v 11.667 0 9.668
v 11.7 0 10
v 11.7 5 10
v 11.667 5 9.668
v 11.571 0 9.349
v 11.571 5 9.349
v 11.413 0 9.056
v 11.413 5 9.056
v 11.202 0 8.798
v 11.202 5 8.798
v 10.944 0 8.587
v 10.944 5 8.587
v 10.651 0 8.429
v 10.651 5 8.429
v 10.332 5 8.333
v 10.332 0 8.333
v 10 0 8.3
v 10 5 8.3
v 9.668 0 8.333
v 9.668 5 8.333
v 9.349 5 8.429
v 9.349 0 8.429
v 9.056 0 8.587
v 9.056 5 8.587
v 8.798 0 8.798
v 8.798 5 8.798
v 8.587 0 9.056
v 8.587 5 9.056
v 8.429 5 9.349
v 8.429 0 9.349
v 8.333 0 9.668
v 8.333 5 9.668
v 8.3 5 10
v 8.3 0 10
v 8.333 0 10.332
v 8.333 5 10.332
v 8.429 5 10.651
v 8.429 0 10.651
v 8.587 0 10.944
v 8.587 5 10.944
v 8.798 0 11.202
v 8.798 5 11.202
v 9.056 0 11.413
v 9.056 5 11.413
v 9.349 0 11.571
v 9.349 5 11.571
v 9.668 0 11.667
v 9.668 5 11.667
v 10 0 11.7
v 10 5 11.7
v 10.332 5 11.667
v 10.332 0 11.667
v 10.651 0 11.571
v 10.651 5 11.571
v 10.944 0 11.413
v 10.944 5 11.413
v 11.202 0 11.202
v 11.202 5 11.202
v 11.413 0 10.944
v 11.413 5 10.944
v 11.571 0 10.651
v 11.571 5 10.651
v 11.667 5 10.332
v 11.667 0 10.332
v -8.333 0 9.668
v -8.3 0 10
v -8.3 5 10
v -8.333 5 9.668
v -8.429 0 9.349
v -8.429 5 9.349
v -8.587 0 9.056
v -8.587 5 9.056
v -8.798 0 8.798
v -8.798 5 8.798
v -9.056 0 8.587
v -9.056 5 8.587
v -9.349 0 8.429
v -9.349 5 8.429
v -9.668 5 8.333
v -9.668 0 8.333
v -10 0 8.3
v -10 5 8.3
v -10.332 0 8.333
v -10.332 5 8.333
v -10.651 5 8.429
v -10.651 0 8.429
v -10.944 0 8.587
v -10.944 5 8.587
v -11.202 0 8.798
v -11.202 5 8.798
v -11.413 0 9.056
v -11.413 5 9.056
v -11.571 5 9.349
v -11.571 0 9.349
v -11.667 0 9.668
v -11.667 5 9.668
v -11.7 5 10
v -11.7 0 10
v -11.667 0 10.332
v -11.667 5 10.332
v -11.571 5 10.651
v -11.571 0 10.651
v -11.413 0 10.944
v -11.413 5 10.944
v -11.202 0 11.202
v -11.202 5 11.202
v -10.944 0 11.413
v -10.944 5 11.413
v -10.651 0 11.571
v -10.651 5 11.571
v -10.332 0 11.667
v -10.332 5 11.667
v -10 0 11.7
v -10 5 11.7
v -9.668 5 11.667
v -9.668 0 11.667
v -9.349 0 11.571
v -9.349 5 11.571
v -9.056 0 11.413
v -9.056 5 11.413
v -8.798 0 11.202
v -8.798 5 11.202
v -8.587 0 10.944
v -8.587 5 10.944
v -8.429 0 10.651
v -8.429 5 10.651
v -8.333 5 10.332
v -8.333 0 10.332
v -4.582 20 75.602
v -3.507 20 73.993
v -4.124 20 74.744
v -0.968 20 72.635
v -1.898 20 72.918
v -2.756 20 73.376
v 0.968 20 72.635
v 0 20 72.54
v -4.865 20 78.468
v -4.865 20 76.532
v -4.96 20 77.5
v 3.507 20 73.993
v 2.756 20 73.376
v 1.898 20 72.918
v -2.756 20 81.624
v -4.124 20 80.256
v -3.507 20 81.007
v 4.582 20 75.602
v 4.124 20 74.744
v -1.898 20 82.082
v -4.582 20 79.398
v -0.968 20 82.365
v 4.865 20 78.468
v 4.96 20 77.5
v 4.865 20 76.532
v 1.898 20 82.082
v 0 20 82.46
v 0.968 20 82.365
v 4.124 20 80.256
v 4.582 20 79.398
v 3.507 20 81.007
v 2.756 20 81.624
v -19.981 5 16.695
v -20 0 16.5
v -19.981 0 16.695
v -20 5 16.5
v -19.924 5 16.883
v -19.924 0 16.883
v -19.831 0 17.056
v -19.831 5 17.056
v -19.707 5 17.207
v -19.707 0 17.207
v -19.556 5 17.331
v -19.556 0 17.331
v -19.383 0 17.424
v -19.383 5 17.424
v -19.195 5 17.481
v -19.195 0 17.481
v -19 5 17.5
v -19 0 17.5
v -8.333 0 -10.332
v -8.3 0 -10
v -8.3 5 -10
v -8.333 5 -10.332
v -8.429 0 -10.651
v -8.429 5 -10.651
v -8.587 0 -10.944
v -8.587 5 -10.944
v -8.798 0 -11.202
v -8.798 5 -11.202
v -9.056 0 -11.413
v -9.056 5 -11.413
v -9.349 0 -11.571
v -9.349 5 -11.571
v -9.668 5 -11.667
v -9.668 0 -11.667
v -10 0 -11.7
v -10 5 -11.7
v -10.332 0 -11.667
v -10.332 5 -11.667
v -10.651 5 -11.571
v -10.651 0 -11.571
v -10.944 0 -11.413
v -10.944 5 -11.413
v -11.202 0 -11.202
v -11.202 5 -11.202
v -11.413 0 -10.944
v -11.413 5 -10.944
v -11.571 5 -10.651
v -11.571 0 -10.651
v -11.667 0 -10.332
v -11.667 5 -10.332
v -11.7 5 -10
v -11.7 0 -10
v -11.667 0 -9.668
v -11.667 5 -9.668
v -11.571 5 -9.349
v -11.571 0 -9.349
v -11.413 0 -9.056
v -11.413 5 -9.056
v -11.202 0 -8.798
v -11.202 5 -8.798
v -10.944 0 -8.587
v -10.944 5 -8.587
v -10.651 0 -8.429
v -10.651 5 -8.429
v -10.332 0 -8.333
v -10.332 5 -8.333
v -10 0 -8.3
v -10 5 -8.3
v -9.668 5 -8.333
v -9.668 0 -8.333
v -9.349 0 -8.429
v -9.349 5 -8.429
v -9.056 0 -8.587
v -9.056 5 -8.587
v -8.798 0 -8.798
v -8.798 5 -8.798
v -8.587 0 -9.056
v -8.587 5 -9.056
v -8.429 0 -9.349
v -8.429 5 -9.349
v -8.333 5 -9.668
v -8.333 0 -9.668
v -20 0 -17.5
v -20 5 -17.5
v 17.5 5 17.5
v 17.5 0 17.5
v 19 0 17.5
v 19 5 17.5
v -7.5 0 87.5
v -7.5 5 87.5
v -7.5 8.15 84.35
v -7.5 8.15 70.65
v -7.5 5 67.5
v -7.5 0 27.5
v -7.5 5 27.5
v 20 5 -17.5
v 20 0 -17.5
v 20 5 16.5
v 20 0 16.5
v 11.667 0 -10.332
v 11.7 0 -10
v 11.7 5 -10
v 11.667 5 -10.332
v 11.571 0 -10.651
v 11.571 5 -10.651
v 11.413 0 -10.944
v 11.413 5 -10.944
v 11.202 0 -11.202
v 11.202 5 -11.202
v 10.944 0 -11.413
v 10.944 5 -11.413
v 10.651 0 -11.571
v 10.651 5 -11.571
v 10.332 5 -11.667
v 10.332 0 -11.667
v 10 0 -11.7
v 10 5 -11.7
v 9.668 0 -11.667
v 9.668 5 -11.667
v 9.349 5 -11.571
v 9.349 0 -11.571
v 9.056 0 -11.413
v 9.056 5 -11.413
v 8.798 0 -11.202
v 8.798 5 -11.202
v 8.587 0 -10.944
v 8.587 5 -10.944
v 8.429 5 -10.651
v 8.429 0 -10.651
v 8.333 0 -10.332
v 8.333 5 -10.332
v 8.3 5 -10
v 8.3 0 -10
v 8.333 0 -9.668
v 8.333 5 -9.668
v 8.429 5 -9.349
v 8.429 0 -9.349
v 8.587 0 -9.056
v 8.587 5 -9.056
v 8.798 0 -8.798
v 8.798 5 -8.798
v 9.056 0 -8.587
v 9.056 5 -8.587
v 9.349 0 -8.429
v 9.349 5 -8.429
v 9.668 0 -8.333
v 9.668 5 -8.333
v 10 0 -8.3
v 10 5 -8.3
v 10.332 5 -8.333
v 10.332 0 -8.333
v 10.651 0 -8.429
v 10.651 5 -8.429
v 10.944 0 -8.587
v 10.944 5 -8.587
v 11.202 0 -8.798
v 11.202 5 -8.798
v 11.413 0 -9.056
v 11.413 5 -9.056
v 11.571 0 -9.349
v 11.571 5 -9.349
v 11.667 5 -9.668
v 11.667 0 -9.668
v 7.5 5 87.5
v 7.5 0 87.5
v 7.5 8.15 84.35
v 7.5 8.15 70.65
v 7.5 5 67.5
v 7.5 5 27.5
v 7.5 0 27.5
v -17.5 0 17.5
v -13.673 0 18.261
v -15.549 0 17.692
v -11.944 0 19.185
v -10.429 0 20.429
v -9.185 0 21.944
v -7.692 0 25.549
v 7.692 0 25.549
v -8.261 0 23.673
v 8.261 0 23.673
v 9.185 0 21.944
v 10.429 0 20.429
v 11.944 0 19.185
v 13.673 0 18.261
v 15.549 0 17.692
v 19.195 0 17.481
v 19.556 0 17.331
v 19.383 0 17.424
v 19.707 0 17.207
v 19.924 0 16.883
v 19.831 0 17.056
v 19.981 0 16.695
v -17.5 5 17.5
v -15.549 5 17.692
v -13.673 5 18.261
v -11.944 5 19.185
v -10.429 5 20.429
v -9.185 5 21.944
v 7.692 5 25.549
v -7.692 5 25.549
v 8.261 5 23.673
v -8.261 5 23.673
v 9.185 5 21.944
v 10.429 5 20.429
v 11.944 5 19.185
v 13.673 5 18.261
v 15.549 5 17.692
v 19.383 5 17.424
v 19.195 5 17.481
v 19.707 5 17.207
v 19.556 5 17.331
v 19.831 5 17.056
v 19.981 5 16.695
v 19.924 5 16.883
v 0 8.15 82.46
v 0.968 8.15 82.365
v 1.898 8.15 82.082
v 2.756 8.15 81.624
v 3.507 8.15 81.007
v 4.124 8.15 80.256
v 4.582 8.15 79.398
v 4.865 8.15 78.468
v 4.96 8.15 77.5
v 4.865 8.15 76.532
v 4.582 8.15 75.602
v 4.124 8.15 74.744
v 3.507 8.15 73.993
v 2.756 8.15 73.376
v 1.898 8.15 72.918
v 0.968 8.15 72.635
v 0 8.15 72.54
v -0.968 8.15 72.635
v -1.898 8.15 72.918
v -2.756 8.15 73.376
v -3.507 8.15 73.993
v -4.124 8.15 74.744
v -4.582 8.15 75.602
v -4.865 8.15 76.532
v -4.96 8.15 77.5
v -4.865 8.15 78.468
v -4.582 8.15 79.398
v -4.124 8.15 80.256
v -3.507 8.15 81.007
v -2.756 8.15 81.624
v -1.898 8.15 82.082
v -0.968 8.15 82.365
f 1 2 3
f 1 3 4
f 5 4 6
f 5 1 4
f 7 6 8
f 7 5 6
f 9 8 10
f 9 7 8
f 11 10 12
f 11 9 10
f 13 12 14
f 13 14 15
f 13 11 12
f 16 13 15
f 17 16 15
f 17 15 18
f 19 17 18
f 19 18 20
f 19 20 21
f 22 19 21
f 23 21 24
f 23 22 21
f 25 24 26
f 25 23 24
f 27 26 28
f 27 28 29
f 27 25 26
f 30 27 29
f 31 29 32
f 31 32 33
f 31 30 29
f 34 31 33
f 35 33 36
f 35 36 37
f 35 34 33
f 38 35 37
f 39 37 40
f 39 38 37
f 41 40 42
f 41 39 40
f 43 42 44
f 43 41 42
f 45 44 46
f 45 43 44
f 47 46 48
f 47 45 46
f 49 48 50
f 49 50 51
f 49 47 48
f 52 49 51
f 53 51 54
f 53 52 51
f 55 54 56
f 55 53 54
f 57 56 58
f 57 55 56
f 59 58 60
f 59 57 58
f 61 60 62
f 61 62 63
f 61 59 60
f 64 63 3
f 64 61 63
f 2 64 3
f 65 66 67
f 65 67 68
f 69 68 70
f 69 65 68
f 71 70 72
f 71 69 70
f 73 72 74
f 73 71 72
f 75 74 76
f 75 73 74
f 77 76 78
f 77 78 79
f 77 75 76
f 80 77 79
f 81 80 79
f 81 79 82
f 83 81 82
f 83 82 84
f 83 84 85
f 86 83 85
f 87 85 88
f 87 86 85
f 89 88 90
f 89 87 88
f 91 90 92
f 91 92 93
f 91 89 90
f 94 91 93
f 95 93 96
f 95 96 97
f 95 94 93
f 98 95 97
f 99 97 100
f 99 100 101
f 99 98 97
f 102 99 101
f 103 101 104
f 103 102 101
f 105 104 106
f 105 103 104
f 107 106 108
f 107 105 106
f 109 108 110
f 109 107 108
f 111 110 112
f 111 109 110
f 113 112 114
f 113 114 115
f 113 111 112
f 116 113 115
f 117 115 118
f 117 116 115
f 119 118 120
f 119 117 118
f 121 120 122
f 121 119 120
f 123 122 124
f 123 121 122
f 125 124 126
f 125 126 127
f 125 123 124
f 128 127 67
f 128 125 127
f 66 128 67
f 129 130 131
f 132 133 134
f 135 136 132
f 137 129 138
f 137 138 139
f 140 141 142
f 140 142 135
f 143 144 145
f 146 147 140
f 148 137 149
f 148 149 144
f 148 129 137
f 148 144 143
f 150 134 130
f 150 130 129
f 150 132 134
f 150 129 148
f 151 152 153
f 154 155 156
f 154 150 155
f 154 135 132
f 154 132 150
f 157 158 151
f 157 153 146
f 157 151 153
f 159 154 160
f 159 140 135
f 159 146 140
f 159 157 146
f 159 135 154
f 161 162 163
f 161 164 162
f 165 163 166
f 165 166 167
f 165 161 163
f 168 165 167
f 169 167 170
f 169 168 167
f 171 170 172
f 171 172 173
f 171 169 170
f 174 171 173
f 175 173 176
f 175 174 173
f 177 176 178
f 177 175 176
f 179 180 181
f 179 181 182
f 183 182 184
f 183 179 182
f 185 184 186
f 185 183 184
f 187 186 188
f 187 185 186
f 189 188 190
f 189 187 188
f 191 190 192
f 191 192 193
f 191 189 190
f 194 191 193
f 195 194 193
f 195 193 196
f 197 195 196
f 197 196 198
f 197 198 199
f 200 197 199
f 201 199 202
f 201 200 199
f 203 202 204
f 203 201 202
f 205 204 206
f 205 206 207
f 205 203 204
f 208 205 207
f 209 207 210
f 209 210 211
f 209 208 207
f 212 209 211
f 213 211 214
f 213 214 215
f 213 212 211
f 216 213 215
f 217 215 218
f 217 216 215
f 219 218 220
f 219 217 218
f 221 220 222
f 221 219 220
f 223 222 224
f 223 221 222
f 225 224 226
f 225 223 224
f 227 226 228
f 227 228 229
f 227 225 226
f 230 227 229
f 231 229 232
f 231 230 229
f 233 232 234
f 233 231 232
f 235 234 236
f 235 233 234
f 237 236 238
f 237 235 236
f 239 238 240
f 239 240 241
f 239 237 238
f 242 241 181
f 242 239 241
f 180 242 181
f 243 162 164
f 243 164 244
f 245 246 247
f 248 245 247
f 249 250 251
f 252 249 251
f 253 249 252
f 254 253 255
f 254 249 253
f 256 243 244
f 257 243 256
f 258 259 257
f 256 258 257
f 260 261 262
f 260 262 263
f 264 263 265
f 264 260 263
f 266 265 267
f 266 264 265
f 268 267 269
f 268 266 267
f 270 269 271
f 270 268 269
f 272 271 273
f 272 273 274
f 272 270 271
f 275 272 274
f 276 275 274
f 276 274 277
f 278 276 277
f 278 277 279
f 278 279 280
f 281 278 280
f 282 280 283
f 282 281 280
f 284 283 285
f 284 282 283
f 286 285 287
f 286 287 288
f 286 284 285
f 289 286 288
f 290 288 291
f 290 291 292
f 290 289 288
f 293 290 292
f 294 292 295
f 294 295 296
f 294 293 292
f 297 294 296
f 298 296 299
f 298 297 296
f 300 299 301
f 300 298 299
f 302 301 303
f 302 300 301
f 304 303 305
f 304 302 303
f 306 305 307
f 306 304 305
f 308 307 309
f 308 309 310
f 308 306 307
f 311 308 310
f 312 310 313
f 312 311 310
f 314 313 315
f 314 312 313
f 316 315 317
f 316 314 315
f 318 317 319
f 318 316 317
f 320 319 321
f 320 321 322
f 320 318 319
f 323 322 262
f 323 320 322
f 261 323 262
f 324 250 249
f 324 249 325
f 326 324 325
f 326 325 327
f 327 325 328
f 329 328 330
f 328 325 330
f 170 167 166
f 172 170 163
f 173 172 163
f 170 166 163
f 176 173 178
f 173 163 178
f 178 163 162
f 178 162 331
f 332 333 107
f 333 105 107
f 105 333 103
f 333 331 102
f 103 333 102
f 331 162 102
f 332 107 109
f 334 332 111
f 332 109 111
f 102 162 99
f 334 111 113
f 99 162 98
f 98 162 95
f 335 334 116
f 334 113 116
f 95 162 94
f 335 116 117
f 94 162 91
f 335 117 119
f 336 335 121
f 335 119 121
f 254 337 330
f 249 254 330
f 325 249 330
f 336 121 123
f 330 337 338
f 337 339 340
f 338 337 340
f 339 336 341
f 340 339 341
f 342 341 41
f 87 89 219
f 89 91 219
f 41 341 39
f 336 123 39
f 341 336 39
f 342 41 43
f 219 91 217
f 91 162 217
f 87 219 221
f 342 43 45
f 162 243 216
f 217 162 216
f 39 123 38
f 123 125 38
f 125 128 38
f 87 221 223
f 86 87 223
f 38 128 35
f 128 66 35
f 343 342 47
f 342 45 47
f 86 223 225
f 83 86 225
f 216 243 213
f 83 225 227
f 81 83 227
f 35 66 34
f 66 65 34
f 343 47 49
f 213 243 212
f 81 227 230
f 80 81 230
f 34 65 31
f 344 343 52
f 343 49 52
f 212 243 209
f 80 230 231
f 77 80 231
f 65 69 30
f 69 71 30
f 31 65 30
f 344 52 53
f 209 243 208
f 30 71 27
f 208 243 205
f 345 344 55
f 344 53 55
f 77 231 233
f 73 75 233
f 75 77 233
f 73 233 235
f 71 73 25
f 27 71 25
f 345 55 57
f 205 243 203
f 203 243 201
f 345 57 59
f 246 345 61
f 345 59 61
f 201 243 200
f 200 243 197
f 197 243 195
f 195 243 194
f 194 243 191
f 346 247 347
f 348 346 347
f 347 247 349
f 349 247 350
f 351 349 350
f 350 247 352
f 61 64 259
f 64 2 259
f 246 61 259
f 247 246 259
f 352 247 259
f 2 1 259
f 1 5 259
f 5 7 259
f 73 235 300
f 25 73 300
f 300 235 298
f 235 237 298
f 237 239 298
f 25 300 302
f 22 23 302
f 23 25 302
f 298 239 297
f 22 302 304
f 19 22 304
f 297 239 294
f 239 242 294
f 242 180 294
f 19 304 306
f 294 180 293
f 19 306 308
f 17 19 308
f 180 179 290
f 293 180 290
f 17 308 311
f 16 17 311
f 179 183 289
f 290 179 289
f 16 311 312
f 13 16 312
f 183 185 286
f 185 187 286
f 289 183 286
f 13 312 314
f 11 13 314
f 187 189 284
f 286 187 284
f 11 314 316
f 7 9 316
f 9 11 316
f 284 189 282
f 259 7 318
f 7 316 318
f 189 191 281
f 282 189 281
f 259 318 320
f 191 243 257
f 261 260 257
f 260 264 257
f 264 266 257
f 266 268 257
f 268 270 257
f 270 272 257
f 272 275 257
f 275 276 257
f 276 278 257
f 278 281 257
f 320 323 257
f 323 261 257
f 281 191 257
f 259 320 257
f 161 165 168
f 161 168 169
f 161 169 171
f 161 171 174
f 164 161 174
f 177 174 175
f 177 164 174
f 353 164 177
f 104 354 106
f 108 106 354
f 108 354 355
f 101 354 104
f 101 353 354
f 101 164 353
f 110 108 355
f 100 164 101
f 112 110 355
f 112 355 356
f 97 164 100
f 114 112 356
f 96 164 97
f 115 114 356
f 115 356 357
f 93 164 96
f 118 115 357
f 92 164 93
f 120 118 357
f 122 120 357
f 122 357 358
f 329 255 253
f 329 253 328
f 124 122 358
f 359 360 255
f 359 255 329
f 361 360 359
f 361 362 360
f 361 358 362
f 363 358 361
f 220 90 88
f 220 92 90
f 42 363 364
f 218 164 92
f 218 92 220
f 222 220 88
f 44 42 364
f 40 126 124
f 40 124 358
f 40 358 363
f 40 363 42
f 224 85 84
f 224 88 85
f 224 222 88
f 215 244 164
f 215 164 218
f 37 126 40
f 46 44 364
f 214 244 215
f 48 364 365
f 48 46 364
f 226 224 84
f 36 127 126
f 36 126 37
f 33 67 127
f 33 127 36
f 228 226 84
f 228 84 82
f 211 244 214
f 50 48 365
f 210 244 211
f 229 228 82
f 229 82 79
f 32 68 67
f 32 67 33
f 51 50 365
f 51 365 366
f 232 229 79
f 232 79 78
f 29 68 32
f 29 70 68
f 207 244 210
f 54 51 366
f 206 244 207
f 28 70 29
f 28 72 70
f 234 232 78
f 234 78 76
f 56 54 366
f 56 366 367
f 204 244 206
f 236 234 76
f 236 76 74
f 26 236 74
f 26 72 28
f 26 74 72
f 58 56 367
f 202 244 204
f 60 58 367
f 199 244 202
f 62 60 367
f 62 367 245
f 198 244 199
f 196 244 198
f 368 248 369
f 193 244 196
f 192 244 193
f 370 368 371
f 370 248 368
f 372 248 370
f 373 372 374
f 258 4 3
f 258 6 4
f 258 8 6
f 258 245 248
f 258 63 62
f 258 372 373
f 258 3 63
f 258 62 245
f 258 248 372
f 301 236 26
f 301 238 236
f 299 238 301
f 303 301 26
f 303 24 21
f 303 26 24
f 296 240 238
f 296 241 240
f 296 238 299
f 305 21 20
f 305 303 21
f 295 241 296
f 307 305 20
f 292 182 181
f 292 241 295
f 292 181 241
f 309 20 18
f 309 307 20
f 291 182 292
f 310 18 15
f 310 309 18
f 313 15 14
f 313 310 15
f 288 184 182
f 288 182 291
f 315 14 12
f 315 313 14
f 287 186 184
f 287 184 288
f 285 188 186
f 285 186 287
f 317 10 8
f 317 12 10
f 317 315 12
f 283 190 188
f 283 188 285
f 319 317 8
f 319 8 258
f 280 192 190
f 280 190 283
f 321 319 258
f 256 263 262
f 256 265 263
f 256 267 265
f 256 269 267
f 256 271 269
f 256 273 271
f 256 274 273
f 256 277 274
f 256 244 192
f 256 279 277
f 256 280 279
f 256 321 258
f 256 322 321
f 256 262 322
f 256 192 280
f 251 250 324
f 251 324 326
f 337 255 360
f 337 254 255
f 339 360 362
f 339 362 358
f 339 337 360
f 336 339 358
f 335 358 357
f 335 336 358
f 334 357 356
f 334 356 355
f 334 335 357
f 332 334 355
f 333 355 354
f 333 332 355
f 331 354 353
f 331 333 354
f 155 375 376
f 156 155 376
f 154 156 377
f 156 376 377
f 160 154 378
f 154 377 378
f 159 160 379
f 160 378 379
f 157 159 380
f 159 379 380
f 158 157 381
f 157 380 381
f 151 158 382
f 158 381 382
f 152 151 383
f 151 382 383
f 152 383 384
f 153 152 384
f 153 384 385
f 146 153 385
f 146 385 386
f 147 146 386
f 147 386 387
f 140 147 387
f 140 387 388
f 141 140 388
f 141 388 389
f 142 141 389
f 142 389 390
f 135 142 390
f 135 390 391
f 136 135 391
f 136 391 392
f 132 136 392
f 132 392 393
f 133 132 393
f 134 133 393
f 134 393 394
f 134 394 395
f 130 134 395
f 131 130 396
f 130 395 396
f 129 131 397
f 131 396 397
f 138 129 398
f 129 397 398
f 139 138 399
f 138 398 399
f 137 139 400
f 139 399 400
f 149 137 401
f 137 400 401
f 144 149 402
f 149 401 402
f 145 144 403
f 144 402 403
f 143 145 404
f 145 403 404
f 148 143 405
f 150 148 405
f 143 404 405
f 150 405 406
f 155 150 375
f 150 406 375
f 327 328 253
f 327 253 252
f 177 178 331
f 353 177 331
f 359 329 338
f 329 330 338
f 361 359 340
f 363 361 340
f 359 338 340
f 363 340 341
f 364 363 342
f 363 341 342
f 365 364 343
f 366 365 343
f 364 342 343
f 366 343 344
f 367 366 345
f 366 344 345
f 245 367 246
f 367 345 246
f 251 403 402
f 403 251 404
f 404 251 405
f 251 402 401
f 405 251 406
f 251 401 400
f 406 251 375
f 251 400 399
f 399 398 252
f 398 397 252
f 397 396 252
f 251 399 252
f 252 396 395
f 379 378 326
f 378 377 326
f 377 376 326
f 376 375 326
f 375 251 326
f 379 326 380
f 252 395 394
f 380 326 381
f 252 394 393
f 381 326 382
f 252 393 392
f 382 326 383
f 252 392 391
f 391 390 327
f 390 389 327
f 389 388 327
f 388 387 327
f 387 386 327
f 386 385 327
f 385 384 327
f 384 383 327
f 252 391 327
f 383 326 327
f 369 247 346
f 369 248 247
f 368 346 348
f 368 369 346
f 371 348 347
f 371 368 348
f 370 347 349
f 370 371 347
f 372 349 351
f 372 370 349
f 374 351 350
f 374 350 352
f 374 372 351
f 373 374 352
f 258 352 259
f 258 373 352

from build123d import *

# Parameters (mm, degrees)
SKETCH1_W                    = 40
SKETCH1_H                    = 35
BOSS_EXTRUDE1_DEPTH          = 5
M3_CLEARANCE_HOLE1_OUTLINE_R = 1.7
M3_CLEARANCE_HOLE1_DEPTH     = 5
SKETCH7_W                    = 15
SKETCH7_H                    = 70
BOSS_EXTRUDE3_DEPTH          = 5
SKETCH8_R                    = 4.96
BOSS_EXTRUDE4_DEPTH          = 15
SKETCH9_W                    = 15
SKETCH9_H                    = 12
BOSS_EXTRUDE5_DEPTH          = 3.15
FILLET1_R                    = 10
FILLET2_R                    = 1
CHAMFER1_SIZE                = 4


# Read off the part's stored shape, not the designer's step: M3 Clearance Hole1
with BuildPart() as part:
    # Sketch1 → Boss-Extrude1 (new body)
    with BuildSketch(Plane(origin=(0, 0, 0), x_dir=(1, 0, 0), z_dir=(0, 1, 0))):
        Rectangle(SKETCH1_W, SKETCH1_H)
    extrude(amount=BOSS_EXTRUDE1_DEPTH)

    # M3 Clearance Hole1 outline → M3 Clearance Hole1 (cut)
    with BuildSketch(Plane(origin=(0, 0, 0), x_dir=(1, 0, 0), z_dir=(0, 1, 0))):
        with Locations((10, 10)):
            Circle(M3_CLEARANCE_HOLE1_OUTLINE_R)
        with Locations((-10, -10)):
            Circle(M3_CLEARANCE_HOLE1_OUTLINE_R)
        with Locations((-10, 10)):
            Circle(M3_CLEARANCE_HOLE1_OUTLINE_R)
        with Locations((10, -10)):
            Circle(M3_CLEARANCE_HOLE1_OUTLINE_R)
    extrude(amount=M3_CLEARANCE_HOLE1_DEPTH, mode=Mode.SUBTRACT)

    # Sketch7 → Boss-Extrude3 (add, through all)
    with BuildSketch(Plane(origin=(0, 5, 0), x_dir=(1, 0, 0), z_dir=(0, 1, 0))):
        with Locations((0, -52.5)):
            Rectangle(SKETCH7_W, SKETCH7_H)
    extrude(amount=-BOSS_EXTRUDE3_DEPTH)

    # Sketch8 → Boss-Extrude4 (add)
    with BuildSketch(Plane(origin=(0, 5, 0), x_dir=(1, 0, 0), z_dir=(0, 1, 0))):
        with Locations(Location((0, -77.5, 0), (0, 0, 270))):
            Circle(SKETCH8_R)
    extrude(amount=BOSS_EXTRUDE4_DEPTH)

    # Sketch9 → Boss-Extrude5 (add)
    with BuildSketch(Plane(origin=(0, 5, 0), x_dir=(1, 0, 0), z_dir=(0, 1, 0))):
        with Locations((0, -77.5)):
            Rectangle(SKETCH9_W, SKETCH9_H)
    extrude(amount=BOSS_EXTRUDE5_DEPTH)

    # Fillet1
    fillet1_edges = [part.edges().sort_by_distance(p)[0] for p in [
        (-7.5, 2.5, 17.5),
        (7.5, 2.5, 17.5),
    ]]
    fillet(fillet1_edges, radius=FILLET1_R)

    # Fillet2
    fillet2_edges = [part.edges().sort_by_distance(p)[0] for p in [
        (20, 2.5, 17.5),
        (-20, 2.5, 17.5),
    ]]
    fillet(fillet2_edges, radius=FILLET2_R)

    # Chamfer1
    # the kernel refuses this chamfer: 4 mm, written as the material it adds along each edge
    with BuildSketch(Plane(origin=(7.5, 5, 71.5), x_dir=(0, -0.027495876610586296, -0.9996219169112968), z_dir=(-1, 0, 0))) as chamfer1_piece_1_section:
        Polygon((CHAMFER1_SIZE * 0.999621916911, -CHAMFER1_SIZE * 0.0274958766106), (-CHAMFER1_SIZE * 0.0274958766106, -CHAMFER1_SIZE * 0.999621916911), (0, 0), align=None)
    chamfer1_piece_1 = extrude(amount=15, mode=Mode.PRIVATE)
    chamfer1_piece_1 = split(chamfer1_piece_1, bisect_by=Plane(origin=(0, 8.15, 70.111191503), z_dir=(0, -1, 0)), keep=Keep.TOP, mode=Mode.PRIVATE)
    add(chamfer1_piece_1)
    with BuildSketch(Plane(origin=(-7.5, 5, 83.5), x_dir=(0, -0.027495876610586296, 0.9996219169112968), z_dir=(1, 0, 0))) as chamfer1_piece_2_section:
        Polygon((CHAMFER1_SIZE * 0.999621916911, -CHAMFER1_SIZE * 0.0274958766106), (-CHAMFER1_SIZE * 0.0274958766106, -CHAMFER1_SIZE * 0.999621916911), (0, 0), align=None)
    chamfer1_piece_2 = extrude(amount=15, mode=Mode.PRIVATE)
    chamfer1_piece_2 = split(chamfer1_piece_2, bisect_by=Plane(origin=(0, 6.188699504, 87.5), z_dir=(0, 0, -1)), keep=Keep.TOP, mode=Mode.PRIVATE)
    chamfer1_piece_2 = split(chamfer1_piece_2, bisect_by=Plane(origin=(0, 8.15, 84.884013224), z_dir=(0, -1, 0)), keep=Keep.TOP, mode=Mode.PRIVATE)
    add(chamfer1_piece_2)


solid = part.part
